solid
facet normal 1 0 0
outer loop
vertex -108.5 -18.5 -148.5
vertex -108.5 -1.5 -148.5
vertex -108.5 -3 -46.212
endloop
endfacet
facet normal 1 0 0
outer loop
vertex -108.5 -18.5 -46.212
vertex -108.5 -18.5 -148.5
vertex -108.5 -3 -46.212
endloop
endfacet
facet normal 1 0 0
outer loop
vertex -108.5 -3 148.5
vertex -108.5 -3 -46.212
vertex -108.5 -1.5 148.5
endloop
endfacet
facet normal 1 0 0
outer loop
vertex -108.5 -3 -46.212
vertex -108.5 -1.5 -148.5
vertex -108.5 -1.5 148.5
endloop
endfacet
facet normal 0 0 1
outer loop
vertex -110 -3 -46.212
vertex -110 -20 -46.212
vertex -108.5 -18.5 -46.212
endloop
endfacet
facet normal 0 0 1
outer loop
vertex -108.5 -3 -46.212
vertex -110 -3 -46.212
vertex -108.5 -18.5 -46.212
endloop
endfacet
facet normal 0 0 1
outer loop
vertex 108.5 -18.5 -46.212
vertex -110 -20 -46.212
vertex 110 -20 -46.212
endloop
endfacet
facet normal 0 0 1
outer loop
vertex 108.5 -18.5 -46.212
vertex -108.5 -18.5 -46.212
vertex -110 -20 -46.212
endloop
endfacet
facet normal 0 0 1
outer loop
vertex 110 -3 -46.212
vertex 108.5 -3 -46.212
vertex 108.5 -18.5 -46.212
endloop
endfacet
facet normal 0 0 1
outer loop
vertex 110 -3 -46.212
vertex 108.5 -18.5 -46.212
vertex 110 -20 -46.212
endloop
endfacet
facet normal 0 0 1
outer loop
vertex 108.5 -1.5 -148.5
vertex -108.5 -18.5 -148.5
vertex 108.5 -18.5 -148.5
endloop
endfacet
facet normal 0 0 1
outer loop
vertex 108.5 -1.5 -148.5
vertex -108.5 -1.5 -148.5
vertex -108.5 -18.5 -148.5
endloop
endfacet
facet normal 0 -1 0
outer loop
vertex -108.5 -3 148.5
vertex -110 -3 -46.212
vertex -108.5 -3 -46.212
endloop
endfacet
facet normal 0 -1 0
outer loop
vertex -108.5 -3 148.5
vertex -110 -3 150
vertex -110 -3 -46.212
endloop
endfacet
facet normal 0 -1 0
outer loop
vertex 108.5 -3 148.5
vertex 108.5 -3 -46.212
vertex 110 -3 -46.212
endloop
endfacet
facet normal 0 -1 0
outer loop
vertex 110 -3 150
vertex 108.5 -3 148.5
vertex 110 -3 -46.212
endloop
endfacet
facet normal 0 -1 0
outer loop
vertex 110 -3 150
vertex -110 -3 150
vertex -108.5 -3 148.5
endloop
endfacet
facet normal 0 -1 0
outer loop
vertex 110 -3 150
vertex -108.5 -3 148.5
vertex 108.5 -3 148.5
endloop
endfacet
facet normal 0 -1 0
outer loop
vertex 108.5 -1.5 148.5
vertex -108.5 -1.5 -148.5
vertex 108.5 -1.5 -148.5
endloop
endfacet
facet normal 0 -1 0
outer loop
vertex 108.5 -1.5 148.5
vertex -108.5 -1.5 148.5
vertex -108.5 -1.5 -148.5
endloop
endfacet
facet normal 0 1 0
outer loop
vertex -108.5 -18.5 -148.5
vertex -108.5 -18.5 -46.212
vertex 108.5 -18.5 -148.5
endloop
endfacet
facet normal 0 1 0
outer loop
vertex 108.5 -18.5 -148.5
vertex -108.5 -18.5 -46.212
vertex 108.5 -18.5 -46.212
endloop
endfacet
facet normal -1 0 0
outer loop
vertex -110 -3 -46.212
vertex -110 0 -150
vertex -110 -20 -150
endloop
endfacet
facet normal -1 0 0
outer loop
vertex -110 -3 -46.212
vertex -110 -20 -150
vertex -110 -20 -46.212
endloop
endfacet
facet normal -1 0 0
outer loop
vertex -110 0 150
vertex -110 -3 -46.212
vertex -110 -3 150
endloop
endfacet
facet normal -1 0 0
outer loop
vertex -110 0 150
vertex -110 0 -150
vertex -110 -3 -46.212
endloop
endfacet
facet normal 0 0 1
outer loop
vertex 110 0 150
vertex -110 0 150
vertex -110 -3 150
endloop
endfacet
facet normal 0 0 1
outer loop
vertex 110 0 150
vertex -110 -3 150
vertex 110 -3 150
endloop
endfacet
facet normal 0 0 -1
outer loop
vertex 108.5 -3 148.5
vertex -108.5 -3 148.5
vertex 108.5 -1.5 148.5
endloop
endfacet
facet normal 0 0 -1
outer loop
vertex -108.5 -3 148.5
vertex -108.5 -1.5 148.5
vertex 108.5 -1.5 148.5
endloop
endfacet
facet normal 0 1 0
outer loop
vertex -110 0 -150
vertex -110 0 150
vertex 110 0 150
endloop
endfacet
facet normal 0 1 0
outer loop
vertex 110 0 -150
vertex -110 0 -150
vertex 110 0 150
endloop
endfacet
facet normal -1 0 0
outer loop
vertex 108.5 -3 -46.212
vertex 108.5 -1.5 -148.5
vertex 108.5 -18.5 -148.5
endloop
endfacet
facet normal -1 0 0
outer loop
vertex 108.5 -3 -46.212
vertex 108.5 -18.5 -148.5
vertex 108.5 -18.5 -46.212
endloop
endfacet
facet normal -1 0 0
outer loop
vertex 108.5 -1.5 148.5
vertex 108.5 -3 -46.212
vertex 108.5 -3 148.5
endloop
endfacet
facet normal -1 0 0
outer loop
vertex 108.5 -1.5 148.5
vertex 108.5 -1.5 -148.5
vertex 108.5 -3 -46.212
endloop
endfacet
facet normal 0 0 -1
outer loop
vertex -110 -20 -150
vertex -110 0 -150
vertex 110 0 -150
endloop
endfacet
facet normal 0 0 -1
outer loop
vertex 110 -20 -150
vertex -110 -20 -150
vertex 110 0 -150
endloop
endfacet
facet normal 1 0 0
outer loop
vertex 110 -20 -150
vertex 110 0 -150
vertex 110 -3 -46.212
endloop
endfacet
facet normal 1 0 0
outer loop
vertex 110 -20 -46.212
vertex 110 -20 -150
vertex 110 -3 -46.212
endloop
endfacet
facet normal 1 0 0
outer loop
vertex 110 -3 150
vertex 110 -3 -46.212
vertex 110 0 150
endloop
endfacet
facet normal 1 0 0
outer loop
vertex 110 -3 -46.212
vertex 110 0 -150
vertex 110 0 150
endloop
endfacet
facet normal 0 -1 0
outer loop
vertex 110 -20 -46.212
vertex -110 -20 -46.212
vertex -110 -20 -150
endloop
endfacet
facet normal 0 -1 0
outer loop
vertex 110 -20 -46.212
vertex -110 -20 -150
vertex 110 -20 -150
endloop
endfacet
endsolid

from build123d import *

# Parameters (mm, degrees)
F0_W     = 220
F0_H     = 103.788202
F1_DEPTH = 20
F0_H_2   = 196.211798
F2_DEPTH = 3
F3_T     = -1.5


with BuildPart() as f1:
    # F0 (on Front) → F1 (new body)
    with BuildSketch(Plane.XZ):
        with Locations((0, -98.105899)):
            Rectangle(F0_W, F0_H)
    extrude(amount=F1_DEPTH)

    # F0 (on Front) → F2 (join)
    with BuildSketch(Plane.XZ):
        with Locations((0, 51.894101)):
            Rectangle(F0_W, F0_H_2)
    extrude(amount=F2_DEPTH)

    # F3
    f3_openings = [f1.faces().sort_by_distance(p)[0] for p in [
        (0, -11.5, -46.211798),
        (0, -3, 51.894101),
    ]]
    offset(amount=F3_T, openings=f3_openings)


solid = f1.part
